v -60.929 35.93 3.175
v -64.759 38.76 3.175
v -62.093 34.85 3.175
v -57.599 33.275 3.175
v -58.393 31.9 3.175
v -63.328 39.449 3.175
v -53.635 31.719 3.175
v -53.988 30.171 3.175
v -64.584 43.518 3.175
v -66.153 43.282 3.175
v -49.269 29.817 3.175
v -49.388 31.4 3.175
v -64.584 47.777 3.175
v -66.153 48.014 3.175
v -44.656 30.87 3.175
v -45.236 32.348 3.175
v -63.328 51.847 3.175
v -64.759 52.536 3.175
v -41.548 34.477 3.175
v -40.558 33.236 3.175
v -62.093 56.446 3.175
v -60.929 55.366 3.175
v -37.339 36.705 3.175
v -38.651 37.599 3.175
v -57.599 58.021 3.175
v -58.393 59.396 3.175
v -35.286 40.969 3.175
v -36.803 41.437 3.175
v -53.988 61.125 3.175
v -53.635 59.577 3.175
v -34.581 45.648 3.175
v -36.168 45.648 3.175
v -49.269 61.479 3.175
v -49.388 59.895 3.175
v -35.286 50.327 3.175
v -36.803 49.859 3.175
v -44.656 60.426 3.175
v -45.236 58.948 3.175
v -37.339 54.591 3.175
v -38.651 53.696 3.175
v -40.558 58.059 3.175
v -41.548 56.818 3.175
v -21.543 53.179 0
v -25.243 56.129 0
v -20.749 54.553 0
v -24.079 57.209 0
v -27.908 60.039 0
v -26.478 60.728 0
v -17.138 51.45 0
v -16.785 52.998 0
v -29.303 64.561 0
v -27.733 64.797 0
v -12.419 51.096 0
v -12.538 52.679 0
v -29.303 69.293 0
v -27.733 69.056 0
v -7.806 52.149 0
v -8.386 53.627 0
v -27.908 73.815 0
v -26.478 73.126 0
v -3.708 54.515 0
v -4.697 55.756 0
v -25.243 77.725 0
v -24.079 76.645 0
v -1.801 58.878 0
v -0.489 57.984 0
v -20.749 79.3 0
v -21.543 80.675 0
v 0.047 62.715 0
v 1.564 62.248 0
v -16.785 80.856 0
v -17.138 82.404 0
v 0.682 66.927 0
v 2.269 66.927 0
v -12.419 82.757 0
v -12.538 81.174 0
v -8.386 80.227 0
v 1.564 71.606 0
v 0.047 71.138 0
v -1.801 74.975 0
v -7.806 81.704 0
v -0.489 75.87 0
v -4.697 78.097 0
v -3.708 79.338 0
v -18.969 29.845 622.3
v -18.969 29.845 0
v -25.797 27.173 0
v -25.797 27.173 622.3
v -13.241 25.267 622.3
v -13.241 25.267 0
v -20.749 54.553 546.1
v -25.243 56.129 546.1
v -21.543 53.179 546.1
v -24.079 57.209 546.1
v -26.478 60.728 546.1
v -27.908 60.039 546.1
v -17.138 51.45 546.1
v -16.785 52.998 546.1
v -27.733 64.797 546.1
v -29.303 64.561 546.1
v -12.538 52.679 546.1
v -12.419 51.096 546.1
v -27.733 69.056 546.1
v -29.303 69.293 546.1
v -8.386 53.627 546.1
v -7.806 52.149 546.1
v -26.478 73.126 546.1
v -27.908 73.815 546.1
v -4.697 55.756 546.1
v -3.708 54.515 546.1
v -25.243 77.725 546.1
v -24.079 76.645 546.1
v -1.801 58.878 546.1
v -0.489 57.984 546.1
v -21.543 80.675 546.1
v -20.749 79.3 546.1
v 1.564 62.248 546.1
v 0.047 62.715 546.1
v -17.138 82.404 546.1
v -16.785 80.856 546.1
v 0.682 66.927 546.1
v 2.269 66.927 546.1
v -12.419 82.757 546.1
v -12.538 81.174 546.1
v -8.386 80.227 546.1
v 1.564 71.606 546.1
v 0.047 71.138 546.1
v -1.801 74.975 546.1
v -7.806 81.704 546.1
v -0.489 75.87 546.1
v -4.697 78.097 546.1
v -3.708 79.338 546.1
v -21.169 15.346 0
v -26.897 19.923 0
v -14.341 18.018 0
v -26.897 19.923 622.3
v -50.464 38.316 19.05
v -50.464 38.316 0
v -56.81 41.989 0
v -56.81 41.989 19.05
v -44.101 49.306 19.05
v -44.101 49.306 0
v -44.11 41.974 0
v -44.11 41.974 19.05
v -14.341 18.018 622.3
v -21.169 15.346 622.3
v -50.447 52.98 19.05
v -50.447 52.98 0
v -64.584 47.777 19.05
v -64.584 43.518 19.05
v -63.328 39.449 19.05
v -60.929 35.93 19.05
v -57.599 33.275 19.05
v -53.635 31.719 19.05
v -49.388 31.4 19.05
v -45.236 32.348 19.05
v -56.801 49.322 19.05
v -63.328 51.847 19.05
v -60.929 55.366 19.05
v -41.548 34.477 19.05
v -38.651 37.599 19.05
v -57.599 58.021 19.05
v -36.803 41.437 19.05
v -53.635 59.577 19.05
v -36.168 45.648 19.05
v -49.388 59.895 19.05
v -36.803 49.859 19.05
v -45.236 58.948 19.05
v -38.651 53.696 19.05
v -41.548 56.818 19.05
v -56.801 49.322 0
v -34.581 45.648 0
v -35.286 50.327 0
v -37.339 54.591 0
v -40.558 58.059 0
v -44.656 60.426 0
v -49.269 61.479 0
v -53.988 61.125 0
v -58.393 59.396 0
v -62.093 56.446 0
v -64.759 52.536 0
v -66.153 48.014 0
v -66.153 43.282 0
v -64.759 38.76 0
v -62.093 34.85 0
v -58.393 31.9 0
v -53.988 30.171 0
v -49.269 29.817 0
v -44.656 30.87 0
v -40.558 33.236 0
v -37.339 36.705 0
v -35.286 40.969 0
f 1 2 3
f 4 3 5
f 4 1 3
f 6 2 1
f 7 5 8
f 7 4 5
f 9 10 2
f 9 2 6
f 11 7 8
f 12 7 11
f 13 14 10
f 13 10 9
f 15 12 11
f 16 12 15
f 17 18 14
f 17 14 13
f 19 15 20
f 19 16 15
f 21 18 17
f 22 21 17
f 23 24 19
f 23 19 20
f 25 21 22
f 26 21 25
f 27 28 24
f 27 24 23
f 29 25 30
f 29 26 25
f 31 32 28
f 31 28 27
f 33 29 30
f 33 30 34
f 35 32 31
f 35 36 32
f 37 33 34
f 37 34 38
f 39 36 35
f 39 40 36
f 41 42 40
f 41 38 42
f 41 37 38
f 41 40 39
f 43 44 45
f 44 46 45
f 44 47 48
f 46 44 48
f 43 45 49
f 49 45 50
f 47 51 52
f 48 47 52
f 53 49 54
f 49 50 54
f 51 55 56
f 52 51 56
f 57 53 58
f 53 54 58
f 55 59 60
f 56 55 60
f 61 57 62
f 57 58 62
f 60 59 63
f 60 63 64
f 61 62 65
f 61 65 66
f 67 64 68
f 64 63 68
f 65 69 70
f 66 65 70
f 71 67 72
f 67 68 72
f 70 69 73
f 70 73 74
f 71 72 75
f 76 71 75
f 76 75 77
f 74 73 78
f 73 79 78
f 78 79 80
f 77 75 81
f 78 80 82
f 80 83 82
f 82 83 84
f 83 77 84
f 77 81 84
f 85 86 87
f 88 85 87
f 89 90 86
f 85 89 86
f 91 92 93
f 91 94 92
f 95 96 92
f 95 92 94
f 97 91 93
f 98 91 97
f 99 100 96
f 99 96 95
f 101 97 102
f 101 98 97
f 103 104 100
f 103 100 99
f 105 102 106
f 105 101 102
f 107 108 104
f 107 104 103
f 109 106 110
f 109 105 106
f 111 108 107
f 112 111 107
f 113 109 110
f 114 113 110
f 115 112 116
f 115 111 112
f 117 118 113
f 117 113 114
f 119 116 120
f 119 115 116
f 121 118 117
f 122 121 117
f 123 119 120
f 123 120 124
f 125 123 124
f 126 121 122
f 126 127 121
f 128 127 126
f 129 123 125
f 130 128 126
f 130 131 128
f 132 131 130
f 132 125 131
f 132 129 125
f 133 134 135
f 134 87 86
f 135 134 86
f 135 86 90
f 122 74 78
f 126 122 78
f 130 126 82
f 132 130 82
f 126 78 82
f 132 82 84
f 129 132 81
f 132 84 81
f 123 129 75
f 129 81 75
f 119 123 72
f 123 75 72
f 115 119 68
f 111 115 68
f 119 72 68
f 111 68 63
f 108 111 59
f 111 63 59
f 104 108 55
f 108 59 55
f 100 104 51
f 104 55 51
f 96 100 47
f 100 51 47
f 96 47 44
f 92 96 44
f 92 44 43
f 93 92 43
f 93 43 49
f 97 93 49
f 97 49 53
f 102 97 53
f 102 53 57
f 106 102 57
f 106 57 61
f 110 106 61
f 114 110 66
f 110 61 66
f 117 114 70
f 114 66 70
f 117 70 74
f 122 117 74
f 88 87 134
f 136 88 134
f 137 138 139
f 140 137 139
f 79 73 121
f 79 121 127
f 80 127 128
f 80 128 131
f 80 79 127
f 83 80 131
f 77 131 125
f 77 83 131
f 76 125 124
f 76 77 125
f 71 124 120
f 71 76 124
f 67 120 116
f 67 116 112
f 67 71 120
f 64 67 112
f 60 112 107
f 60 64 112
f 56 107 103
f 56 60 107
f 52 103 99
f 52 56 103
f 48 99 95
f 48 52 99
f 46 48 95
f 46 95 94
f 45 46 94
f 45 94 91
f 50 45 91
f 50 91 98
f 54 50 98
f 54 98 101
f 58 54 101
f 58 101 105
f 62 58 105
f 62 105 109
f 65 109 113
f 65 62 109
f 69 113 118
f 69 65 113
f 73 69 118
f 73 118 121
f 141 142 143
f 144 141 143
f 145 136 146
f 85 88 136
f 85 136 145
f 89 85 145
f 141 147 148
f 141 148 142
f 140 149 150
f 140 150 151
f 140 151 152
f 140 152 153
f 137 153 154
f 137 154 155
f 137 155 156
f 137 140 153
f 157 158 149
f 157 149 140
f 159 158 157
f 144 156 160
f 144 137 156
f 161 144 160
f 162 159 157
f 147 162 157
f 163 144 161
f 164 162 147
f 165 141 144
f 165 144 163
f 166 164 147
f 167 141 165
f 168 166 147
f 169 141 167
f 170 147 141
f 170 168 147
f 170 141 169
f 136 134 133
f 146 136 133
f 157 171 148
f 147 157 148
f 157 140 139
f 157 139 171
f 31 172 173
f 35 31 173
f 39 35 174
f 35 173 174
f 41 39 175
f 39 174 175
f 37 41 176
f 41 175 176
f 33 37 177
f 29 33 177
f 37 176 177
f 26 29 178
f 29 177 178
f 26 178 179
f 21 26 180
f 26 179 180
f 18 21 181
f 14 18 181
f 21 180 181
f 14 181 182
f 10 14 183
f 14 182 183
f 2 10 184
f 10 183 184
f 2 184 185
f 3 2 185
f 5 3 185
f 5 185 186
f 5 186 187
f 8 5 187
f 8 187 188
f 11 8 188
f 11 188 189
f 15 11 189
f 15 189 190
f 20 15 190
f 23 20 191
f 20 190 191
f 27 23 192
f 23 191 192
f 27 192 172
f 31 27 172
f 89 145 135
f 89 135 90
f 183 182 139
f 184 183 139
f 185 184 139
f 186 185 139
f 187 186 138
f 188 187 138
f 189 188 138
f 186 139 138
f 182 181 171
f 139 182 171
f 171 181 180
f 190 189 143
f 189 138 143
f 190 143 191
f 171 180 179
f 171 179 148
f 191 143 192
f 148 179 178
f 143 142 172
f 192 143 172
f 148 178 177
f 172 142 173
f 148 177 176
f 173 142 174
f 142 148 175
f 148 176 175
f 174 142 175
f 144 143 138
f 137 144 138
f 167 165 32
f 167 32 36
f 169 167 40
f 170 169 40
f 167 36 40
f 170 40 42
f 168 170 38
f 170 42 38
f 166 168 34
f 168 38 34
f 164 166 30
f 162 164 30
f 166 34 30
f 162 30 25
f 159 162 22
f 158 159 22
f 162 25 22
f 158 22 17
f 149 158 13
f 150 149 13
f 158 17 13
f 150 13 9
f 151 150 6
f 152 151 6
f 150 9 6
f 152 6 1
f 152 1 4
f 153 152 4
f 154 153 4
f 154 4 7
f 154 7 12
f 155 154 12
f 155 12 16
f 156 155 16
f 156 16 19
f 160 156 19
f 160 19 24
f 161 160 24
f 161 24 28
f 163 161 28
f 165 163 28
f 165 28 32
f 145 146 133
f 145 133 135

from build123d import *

# Parameters (mm, degrees)
F1_R     = 15.875
F1_R_2   = 14.2875
F2_DEPTH = 3.175
F3_DEPTH = 19.05
F4_R     = 15.875
F4_R_2   = 14.2875
F5_DEPTH = 546.1
F7_DEPTH = 622.3


with BuildPart() as f2:
    # F1 (on Top) → F2 (new body)
    with BuildSketch(Plane.XY):
        with Locations((-50.4556372762, 45.6479154527)):
            Circle(F1_R)
        with Locations((-50.4556372762, 45.6479154527)):
            Circle(F1_R_2, mode=Mode.SUBTRACT)
    extrude(amount=F2_DEPTH)

    # F1 (on Top) → F3 (join)
    with BuildSketch(Plane.XY):
        with Locations((-50.4556372762, 45.6479154527)):
            Circle(F1_R_2)
        Polygon((-56.8100148519, 41.9893339027), (-56.8012506282, 49.3216770836), (-50.4468730524, 52.9802586336), (-44.1012597004, 49.3064970027), (-44.1100239242, 41.9741538219), (-50.4644014999, 38.3155722719), align=None, mode=Mode.SUBTRACT)
    extrude(amount=F3_DEPTH)


with BuildPart() as f5:
    # F4 (on Top) → F5 (new body)
    with BuildSketch(Plane.XY):
        with Locations((-13.6055322364, 66.9268071651)):
            Circle(F4_R)
        with Locations((-13.6055322364, 66.9268071651)):
            Circle(F4_R_2, mode=Mode.SUBTRACT)
    extrude(amount=F5_DEPTH)


with BuildPart() as f7:
    # F6 (on Top) → F7 (new body)
    with BuildSketch(Plane.XY):
        Polygon((-21.1692983805, 15.3458256907), (-14.3411023118, 18.0177298397), (-13.2409411469, 25.2670731716), (-18.9689760507, 29.8445123546), (-25.7971721194, 27.1726082057), (-26.8973332843, 19.9232648738), align=None)
    extrude(amount=F7_DEPTH)


solid = Compound([f2.part, f5.part, f7.part])
